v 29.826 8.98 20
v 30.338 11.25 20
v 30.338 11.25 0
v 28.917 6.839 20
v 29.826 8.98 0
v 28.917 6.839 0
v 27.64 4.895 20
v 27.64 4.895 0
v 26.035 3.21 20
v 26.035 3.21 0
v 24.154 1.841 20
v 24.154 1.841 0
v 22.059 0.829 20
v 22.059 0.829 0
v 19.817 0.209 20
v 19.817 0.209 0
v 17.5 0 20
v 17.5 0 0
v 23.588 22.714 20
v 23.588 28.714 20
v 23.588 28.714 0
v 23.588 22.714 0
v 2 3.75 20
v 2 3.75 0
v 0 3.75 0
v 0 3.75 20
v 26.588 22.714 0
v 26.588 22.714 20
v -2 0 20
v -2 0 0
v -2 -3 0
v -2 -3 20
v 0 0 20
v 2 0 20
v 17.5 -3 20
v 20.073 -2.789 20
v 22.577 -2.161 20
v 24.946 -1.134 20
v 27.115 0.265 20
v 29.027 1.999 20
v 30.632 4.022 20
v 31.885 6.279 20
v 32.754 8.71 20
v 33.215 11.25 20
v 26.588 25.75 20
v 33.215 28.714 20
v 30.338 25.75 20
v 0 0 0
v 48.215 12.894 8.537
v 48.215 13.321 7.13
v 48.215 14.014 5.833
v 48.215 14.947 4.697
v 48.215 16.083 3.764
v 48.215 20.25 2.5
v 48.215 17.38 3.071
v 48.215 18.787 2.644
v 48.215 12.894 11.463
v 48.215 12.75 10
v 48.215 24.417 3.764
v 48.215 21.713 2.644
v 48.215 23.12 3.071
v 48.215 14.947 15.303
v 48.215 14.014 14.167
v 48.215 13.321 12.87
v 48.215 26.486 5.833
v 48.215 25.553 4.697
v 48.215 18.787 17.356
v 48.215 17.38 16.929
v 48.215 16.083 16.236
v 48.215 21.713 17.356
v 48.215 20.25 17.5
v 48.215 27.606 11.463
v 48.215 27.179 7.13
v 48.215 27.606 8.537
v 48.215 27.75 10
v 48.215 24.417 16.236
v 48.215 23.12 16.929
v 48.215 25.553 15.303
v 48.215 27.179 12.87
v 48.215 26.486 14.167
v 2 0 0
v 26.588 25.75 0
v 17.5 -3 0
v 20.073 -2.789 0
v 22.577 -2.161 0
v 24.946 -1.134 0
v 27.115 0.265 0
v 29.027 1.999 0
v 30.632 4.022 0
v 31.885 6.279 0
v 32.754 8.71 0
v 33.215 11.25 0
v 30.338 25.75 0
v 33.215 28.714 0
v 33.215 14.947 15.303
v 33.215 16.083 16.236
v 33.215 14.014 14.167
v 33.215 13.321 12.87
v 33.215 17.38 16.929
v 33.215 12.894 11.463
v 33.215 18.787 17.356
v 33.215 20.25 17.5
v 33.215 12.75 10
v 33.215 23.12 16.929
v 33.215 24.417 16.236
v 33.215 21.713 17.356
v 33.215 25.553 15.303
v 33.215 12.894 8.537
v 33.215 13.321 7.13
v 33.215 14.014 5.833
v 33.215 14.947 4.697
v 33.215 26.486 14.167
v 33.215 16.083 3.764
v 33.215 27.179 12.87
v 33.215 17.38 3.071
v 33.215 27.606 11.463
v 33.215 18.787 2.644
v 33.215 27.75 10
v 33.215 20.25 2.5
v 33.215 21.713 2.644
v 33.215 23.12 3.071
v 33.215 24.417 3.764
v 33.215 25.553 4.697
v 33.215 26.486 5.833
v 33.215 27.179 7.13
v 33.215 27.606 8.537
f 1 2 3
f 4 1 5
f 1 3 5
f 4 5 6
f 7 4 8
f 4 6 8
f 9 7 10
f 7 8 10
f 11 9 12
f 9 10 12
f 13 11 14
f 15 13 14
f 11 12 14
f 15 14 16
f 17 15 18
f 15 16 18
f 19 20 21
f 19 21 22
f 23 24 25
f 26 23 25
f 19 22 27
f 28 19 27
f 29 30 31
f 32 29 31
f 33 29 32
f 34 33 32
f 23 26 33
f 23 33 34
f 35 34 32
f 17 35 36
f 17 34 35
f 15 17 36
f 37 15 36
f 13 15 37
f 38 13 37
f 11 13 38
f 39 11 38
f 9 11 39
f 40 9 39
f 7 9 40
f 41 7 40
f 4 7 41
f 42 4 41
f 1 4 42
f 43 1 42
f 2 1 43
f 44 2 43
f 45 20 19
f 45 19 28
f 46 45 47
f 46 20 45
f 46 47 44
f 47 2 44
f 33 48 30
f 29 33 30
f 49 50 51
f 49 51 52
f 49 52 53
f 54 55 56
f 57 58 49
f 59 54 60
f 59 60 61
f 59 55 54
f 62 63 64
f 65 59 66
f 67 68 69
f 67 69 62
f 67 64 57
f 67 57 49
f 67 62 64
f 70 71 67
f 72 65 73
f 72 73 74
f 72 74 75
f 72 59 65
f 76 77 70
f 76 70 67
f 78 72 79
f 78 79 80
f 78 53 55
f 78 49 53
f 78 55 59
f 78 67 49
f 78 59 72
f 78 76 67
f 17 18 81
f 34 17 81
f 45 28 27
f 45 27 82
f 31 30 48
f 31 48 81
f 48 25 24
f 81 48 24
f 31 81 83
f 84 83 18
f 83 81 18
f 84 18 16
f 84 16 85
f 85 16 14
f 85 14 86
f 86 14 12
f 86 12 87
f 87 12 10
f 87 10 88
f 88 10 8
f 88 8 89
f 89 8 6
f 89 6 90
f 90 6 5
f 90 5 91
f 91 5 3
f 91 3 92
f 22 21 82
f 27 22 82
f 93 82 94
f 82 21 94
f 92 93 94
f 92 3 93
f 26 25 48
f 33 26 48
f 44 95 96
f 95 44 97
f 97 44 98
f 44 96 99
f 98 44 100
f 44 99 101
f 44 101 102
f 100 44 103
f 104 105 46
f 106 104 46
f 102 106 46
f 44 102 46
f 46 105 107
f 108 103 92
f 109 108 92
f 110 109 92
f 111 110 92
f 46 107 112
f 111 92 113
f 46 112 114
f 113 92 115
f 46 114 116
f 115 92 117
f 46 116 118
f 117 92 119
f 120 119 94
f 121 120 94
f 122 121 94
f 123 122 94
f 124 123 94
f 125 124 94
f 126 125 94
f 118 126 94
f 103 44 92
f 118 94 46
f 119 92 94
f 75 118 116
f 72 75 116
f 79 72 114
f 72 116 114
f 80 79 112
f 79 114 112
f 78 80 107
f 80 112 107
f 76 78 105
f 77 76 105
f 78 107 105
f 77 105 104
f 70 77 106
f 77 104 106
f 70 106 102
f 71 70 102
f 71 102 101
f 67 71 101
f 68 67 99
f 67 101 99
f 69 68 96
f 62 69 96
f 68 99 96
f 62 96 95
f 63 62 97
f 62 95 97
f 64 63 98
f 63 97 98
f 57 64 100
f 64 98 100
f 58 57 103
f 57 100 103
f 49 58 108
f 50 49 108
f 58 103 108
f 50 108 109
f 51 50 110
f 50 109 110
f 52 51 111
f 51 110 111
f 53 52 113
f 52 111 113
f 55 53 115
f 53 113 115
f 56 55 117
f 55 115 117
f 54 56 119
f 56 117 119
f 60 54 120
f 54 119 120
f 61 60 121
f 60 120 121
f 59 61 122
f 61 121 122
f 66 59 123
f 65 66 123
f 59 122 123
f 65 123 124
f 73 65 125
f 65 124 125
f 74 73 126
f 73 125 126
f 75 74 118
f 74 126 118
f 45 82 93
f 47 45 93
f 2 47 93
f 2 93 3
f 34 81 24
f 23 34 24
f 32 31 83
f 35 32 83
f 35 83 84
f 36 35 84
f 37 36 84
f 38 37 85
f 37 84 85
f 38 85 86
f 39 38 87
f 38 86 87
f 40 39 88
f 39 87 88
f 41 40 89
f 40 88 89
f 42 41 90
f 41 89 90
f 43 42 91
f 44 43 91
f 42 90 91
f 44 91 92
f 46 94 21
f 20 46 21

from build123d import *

# Parameters (mm, degrees)
F1_DEPTH = 20
F2_R     = 7.5
F3_DEPTH = 15


with BuildPart() as f1:
    # F0 (on Top) → F1 (new body)
    with BuildSketch(Plane.XY):
        with BuildLine():
            Line((2, 3.75), (0, 3.75))
            Line((0, 3.75), (0, 0))
            Line((0, 0), (-2, 0))
            Line((-2, 0), (-2, -3))
            Line((-2, -3), (0, -3))
            Line((0, -3), (17.5, -3))
            ThreePointArc((17.5, -3), (28.106716, 1.092985), (33.214554, 11.25))
            Line((33.214554, 11.25), (33.214554, 28.71393))
            Line((33.214554, 28.71393), (23.58752, 28.71393))
            Line((23.58752, 28.71393), (23.58752, 22.71393))
            Line((23.58752, 22.71393), (26.58752, 22.71393))
            Line((26.58752, 22.71393), (26.58752, 25.75))
            Line((26.58752, 25.75), (30.33752, 25.75))
            Line((30.33752, 25.75), (30.33752, 11.25))
            ThreePointArc((30.33752, 11.25), (26.0347, 3.210474), (17.5, 0))
            Line((17.5, 0), (2, 0))
            Line((2, 0), (2, 3.75))
        make_face()
    extrude(amount=F1_DEPTH)

    # F2 (on face) → F3 (join)
    with BuildSketch(Plane.YZ.offset(33.214554)):
        with Locations((20.25, 10)):
            Circle(F2_R)
    extrude(amount=F3_DEPTH)


solid = f1.part
